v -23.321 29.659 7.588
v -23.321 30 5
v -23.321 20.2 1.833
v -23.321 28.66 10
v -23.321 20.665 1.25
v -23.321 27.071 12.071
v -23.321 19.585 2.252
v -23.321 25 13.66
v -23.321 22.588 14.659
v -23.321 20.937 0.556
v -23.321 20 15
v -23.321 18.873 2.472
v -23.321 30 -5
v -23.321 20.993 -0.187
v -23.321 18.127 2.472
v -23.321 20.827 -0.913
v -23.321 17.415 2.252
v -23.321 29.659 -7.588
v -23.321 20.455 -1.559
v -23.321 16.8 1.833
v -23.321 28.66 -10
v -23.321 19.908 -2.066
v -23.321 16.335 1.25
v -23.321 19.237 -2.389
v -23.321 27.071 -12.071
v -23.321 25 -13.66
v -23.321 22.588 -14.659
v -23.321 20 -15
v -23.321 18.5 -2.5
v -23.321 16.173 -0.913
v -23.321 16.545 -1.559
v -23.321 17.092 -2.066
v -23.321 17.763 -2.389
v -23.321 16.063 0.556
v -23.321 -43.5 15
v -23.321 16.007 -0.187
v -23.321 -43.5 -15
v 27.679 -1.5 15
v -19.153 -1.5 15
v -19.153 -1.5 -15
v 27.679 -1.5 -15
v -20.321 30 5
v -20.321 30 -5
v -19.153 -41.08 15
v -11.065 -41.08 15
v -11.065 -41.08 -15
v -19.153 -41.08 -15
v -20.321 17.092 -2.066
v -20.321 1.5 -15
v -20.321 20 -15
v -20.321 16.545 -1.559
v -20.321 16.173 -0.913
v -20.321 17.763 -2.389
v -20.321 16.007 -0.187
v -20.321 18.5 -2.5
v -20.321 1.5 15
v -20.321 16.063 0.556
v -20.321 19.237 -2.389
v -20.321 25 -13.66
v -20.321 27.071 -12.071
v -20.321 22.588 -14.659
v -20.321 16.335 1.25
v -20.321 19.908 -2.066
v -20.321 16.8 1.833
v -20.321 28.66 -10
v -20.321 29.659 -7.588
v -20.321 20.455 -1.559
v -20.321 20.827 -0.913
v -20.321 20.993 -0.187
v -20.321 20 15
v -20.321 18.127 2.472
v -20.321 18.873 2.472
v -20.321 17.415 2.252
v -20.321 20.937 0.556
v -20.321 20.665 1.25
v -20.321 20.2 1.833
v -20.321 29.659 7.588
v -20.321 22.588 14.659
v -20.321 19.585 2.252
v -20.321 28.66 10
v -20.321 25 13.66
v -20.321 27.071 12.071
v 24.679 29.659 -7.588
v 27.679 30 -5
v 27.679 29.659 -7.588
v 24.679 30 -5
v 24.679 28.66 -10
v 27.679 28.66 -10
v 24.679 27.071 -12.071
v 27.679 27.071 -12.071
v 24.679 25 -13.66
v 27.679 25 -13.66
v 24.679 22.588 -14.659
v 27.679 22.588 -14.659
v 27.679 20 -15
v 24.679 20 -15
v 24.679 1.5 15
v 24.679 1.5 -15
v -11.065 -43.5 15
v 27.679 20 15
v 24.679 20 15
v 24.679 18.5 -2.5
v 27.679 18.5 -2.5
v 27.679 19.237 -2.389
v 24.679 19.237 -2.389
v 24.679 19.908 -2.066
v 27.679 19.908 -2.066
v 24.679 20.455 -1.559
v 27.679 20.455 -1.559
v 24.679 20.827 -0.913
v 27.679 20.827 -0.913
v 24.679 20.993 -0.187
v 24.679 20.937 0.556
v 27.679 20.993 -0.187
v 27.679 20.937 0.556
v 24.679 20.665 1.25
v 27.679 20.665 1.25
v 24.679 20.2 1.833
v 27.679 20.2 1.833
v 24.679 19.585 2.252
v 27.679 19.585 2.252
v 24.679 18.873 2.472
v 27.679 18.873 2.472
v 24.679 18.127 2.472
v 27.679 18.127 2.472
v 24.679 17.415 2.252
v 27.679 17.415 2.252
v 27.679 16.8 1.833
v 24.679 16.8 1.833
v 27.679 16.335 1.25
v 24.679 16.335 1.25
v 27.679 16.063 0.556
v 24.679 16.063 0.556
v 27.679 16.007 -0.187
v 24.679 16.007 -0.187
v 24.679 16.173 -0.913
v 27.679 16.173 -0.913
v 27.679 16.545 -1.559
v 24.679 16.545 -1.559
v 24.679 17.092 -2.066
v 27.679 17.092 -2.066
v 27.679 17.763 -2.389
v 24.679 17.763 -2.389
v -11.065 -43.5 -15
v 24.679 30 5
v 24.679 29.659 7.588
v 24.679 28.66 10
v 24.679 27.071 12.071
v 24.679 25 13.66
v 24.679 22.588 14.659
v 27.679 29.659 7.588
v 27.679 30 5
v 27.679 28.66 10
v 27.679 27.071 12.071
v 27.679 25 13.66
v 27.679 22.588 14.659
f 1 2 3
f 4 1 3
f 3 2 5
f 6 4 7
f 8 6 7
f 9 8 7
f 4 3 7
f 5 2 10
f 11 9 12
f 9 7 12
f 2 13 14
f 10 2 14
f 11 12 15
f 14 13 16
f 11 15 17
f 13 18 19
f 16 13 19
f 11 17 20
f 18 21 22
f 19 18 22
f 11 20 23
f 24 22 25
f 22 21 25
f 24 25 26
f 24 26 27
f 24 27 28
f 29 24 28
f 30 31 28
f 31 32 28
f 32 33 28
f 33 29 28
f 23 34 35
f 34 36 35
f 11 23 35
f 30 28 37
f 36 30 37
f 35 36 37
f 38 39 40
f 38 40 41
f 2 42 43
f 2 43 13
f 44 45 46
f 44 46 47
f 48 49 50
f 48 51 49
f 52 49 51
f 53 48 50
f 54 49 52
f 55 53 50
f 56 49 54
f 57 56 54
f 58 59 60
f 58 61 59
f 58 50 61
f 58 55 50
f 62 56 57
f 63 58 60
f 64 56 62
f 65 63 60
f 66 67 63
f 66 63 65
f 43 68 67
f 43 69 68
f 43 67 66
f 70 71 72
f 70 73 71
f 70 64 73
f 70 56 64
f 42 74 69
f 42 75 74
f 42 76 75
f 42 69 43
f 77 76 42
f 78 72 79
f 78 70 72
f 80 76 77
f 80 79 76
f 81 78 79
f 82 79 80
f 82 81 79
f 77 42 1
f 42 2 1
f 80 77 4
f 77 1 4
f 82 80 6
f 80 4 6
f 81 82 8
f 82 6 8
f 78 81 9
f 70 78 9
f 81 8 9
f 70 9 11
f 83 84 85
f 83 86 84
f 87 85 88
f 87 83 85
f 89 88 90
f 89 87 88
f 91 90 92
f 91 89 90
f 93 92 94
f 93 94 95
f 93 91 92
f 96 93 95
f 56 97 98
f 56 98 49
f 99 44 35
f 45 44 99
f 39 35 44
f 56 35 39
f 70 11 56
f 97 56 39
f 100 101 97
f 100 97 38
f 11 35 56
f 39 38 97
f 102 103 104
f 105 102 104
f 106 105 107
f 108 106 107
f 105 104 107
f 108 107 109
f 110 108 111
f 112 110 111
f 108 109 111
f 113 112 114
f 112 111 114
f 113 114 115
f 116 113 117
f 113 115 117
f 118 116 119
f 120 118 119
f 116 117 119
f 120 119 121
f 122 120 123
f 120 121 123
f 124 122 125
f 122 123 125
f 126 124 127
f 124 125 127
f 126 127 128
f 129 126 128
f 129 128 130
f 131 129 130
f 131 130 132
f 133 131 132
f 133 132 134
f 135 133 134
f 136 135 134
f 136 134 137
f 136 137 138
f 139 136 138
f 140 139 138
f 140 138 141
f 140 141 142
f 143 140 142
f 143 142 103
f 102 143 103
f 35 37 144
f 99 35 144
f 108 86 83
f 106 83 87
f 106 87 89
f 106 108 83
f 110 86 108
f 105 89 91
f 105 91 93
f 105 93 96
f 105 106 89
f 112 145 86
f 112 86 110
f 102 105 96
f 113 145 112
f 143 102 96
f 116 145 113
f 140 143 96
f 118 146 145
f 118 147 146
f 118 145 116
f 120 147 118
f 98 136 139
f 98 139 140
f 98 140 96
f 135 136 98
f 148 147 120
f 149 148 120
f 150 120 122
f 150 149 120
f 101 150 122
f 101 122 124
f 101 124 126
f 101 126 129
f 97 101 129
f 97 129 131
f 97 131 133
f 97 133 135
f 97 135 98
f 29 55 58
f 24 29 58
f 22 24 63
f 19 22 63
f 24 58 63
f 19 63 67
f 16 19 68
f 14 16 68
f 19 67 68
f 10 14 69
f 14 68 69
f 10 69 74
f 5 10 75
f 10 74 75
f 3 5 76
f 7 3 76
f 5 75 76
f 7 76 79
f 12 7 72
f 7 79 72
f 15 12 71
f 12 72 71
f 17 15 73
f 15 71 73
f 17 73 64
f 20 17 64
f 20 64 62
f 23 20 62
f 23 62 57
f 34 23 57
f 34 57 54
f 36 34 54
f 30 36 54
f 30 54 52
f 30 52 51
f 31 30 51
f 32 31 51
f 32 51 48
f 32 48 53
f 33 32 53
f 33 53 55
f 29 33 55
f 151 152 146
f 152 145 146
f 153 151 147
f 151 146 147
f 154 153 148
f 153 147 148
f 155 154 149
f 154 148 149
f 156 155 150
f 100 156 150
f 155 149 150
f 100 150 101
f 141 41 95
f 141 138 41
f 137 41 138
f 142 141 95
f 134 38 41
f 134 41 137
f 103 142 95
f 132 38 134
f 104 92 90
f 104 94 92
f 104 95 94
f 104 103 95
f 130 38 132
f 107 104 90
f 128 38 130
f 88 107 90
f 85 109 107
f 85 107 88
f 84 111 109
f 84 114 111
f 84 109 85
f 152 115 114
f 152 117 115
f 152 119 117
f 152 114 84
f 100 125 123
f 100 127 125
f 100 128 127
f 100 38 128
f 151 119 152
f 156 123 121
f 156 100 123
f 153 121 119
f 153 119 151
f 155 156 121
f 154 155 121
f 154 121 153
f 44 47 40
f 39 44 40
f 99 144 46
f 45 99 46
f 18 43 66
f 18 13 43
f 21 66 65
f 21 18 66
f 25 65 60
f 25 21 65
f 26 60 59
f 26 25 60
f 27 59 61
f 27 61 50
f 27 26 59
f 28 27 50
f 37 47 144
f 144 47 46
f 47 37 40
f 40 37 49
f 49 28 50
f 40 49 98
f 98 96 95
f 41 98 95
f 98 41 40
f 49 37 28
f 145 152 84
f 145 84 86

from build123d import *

# Parameters (mm, degrees)
EXTRUDE_THIN1_DEPTH = 15
FILLET1_R           = 10
SKETCH2_R           = 2.5
CUT_EXTRUDE1_DEPTH  = 55
BOSS_EXTRUDE1_DEPTH = 30


with BuildPart() as part:
    # Sketch1 → Extrude-Thin1 (new, symmetric)
    with BuildSketch(Plane.XY):
        Polygon((-23.321428571, 30), (-23.321428571, -1.5), (27.678571429, -1.5), (27.678571429, 30), (24.678571429, 30), (24.678571429, 1.5), (-20.321428571, 1.5), (-20.321428571, 30), align=None)
    extrude(amount=EXTRUDE_THIN1_DEPTH, both=True)

    # Fillet1
    fillet1_edges = [part.edges().sort_by_distance(p)[0] for p in [
        (-21.821428571, 30, 15),
        (26.178571429, 30, 15),
        (-21.821428571, 30, -15),
        (26.178571429, 30, -15),
    ]]
    fillet(fillet1_edges, radius=FILLET1_R)

    # Sketch2 → Cut-Extrude1 (cut)
    with BuildSketch(Plane(origin=(27.678571429, 0, 0), x_dir=(0, 0, -1), z_dir=(1, 0, 0))):
        with Locations((0, 18.5)):
            Circle(SKETCH2_R)
    extrude(amount=-CUT_EXTRUDE1_DEPTH, mode=Mode.SUBTRACT)

    # Sketch4 → Boss-Extrude1 (add)
    with BuildSketch(Plane(origin=(0, 0, -15), x_dir=(-1, 0, 0), z_dir=(0, 0, -1))):
        Polygon((23.321428571, -1.5), (23.321428571, -43.5), (11.065130386, -43.5), (11.065130386, -41.079631184), (19.153220087, -41.079631184), (19.153220087, -1.5), align=None)
    extrude(amount=-BOSS_EXTRUDE1_DEPTH)


solid = part.part
